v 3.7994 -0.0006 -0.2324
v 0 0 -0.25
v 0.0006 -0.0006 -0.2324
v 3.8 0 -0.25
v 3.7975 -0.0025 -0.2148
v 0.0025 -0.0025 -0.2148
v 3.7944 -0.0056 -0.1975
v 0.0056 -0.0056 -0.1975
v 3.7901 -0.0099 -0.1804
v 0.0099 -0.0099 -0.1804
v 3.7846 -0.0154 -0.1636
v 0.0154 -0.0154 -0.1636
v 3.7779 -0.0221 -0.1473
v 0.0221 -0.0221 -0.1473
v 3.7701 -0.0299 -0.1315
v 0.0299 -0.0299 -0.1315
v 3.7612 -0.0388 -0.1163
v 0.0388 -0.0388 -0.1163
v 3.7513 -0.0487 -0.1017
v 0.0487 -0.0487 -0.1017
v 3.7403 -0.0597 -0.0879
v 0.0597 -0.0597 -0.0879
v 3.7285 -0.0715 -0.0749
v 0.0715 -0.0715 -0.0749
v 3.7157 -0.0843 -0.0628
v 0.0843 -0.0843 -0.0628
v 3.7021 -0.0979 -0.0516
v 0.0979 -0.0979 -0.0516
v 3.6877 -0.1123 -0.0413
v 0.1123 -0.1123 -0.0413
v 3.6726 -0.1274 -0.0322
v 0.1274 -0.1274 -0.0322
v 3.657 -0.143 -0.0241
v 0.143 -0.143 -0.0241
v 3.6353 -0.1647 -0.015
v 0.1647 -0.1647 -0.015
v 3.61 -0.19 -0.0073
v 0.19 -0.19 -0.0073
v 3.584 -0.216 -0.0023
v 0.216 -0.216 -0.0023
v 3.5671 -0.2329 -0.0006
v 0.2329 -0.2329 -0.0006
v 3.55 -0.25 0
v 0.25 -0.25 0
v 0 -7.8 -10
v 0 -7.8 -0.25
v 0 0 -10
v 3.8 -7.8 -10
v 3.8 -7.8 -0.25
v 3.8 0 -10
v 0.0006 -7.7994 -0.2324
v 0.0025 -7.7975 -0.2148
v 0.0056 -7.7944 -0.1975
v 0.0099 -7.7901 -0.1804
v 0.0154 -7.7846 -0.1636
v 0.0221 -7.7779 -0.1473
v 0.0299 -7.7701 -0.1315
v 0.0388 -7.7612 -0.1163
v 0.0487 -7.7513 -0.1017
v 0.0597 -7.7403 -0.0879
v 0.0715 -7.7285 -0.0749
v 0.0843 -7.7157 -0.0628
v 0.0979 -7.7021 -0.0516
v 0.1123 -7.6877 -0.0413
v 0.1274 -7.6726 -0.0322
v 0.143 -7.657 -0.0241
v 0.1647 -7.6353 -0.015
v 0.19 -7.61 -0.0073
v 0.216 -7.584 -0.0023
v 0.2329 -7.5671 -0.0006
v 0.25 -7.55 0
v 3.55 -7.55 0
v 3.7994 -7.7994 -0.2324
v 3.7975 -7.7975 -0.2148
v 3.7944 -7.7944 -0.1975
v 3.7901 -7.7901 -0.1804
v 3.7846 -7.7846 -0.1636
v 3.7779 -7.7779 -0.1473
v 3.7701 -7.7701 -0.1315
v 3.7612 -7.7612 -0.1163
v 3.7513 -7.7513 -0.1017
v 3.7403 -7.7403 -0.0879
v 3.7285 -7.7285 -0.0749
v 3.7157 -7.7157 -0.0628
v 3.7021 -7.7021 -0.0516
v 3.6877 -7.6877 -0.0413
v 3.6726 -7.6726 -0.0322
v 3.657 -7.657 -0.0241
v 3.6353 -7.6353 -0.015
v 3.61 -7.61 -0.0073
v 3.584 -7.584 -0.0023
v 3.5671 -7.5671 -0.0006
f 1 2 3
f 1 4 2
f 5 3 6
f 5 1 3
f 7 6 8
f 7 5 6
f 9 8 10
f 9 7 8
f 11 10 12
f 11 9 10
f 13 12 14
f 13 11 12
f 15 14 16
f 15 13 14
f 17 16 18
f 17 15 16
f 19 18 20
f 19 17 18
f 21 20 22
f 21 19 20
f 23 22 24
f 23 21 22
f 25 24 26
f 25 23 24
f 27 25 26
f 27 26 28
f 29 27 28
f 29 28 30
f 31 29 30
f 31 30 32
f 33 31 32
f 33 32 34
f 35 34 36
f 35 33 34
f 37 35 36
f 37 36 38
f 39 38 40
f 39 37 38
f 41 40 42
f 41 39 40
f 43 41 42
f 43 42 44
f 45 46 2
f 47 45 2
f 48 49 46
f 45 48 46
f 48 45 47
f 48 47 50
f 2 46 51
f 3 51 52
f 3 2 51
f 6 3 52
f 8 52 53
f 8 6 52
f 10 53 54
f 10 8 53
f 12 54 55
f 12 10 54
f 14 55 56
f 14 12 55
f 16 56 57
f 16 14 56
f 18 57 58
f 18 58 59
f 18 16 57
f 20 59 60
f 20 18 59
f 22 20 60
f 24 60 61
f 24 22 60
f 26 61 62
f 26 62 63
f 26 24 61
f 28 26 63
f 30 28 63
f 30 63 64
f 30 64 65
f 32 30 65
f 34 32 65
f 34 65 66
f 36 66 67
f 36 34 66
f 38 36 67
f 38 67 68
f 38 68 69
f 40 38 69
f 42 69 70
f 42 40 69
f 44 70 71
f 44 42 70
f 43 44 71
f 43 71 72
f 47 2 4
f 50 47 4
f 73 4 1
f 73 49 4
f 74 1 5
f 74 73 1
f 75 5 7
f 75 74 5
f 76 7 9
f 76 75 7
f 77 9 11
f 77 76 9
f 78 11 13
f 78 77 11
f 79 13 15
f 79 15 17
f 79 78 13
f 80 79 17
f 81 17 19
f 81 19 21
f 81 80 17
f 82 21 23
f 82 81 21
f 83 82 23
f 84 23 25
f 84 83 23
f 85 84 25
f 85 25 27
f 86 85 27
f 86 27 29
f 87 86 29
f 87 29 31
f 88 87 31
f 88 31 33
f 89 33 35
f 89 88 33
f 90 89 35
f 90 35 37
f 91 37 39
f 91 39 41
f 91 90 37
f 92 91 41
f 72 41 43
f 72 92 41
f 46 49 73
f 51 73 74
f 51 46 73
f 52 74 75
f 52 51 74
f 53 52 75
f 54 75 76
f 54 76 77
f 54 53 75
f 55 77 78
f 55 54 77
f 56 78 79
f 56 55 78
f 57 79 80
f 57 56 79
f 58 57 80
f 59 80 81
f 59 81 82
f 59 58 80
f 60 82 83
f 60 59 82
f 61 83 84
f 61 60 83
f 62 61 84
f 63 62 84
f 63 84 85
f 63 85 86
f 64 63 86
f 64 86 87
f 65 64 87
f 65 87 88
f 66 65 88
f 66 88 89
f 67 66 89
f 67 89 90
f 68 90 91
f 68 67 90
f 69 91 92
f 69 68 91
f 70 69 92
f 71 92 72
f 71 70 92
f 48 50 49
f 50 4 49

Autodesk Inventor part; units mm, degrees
ref_plane "YZ Plane" through (0, 0, 0) normal (1, 0, 0) x (0, 1, 0)
ref_plane "XZ Plane" through (0, 0, 0) normal (0, 1, 0) x (-1, 0, 0)
ref_plane "XY Plane" through (0, 0, 0) normal (0, 0, 1) x (1, 0, 0)
sketch "Sketch1" plane through (0, 0, 0) normal (0, 0, 1) x (1, 0, 0)
  line L0 (0, 0) -> (3.8, 0)
  line L1 (3.8, 0) -> (3.8, -7.8)
  line L2 (3.8, -7.8) -> (0, -7.8)
  line L3 (0, -7.8) -> (0, 0)
  dimension "d0" = 3.8
  dimension "d1" = 7.8
extrude "Extrusion1" add sketch "Sketch1" against normal blind 10
fillet "Fillet1" radius 0.25 4 edges at (1.9, 0, 0) (0, -3.9, 0) (3.8, -3.9, 0) (1.9, -7.8, 0)
equation "\"d0\" = BL_width"
equation "\"d1\" = BL_length"
equation "\"d2\" = BL_depth"
equation "\"d4\" = W_filletRadius"
equation "\"Wheel_Related_W_\" = 0"
equation "\"W_innerDepth\" = 4"
equation "\"W_wallThickness\" = 2"
equation "\"W_holesClearance\" = 0.3"
equation "\"W_outerGearHoleDiameter\" = 5.3"
equation "\"W_innerGearHoleDiameter\" = 10.1"
equation "\"TempSpotReserved7\" = 0"
equation "\"TempSpotReserved8\" = 0"
equation "\"TempSpotReserved9\" = 0"
equation "\"TempSpotReserved10\" = 0"
equation "\"Inner_Gear_Related_IG_\" = 0"
equation "\"IG_shaftDiameter\" = 7.5"
equation "\"IG_shaftLength\" = 15"
equation "\"IG_gearThickness\" = 2"
equation "\"IG_ratioToOuterGear\" = 0.75"
equation "\"IG_skirtThickness\" = 2"
equation "\"IG_extentionLength\" = 18.33333"
equation "\"IG_extentionThickness\" = 3"
equation "\"IG_slitWidth\" = 4"
equation "\"IG_slitlength\" = 8"
equation "\"Outer_Gear_Related_OG_\" = 0"
equation "\"OG_distanceFromCenter\" = 23.33333"
equation "\"OG_shaftDiameter\" = 5"
equation "\"OG_gearDiameter\" = 26.66667"
equation "\"OG_shaftLength\" = 7"
equation "\"OG_gearThickness\" = 2"
equation "\"OG_skirtOffset\" = 1"
equation "\"OG_skirtThickness\" = 1"
equation "\"TempSpotReserved29\" = 0"
equation "\"TempSpotReserved30\" = 0"
equation "\"Leg_Extensions_Related_LE_\" = 0"
equation "\"LE_baseDiameter\" = 5"
equation "\"LE_maxLength\" = 24.6522"
equation "\"LE_thickness\" = 2.5"
equation "\"LE_offsetAboveOuterGear\" = 0"
equation "\"TempSpotReserved35\" = 0"
equation "\"TempSpotReserved36\" = 0"
equation "\"TempSpotReserved37\" = 0"
equation "\"TempSpotReserved38\" = 0"
equation "\"TempSpotReserved39\" = 0"
equation "\"TempSpotReserved40\" = 0"
equation "\"Bearing_Related_B_\" = 0"
equation "\"B_bearingThickness\" = 1"
equation "\"TempSpotReserved42\" = 0"
equation "\"TempSpotReserved43\" = 0"
equation "\"TempSpotReserved44\" = 0"
equation "\"TempSpotReserved45\" = 0"
equation "\"TempSpotReserved46\" = 0"
equation "\"TempSpotReserved47\" = 0"
equation "\"TempSpotReserved48\" = 0"
equation "\"TempSpotReserved49\" = 0"
equation "\"TempSpotReserved50\" = 0"
equation "\"IG_slitDistanceFromCenterHole\" = 8"
equation "\"IG_slitClearance\" = 0.2"
equation "\"Reserved_10\" = 0"
equation "\"Reserved_9\" = 0"
equation "\"Reserved_11\" = 0"
equation "\"Reserved_12\" = 0"
equation "\"Reserved_8\" = 0"
equation "\"Reserved_7\" = 0"
equation "\"Reserved_26\" = 0"
equation "\"Reserved_20\" = 0"
equation "\"Reserved_22\" = 0"
equation "\"Reserved_23\" = 0"
equation "\"Reserved_25\" = 0"
equation "\"Reserved_24\" = 0"
equation "\"Reserved_21\" = 0"
equation "\"Reserved_19\" = 0"
equation "\"Reserved_27\" = 0"
equation "\"Reserved_14\" = 0"
equation "\"Reserved_15\" = 0"
equation "\"Reserved_16\" = 0"
equation "\"Reserved_13\" = 0"
equation "\"Reserved_17\" = 0"
equation "\"Reserved_18\" = 0"
equation "\"Bearing_Related_BR_\" = 0"
equation "\"BR_bearingThickness\" = 1"
equation "\"Block_Related_BL_\" = 0"
equation "\"BL_width\" = 3.8"
equation "\"BL_length\" = 7.8"
equation "\"BL_depth\" = 10"
equation "\"W_filletRadius\" = 0.25"
equation "\"W_extrutsionTaperAngle\" = 2deg"
equation "\"OG_protrudeDistance\" = 3"
properties part number "block1"
